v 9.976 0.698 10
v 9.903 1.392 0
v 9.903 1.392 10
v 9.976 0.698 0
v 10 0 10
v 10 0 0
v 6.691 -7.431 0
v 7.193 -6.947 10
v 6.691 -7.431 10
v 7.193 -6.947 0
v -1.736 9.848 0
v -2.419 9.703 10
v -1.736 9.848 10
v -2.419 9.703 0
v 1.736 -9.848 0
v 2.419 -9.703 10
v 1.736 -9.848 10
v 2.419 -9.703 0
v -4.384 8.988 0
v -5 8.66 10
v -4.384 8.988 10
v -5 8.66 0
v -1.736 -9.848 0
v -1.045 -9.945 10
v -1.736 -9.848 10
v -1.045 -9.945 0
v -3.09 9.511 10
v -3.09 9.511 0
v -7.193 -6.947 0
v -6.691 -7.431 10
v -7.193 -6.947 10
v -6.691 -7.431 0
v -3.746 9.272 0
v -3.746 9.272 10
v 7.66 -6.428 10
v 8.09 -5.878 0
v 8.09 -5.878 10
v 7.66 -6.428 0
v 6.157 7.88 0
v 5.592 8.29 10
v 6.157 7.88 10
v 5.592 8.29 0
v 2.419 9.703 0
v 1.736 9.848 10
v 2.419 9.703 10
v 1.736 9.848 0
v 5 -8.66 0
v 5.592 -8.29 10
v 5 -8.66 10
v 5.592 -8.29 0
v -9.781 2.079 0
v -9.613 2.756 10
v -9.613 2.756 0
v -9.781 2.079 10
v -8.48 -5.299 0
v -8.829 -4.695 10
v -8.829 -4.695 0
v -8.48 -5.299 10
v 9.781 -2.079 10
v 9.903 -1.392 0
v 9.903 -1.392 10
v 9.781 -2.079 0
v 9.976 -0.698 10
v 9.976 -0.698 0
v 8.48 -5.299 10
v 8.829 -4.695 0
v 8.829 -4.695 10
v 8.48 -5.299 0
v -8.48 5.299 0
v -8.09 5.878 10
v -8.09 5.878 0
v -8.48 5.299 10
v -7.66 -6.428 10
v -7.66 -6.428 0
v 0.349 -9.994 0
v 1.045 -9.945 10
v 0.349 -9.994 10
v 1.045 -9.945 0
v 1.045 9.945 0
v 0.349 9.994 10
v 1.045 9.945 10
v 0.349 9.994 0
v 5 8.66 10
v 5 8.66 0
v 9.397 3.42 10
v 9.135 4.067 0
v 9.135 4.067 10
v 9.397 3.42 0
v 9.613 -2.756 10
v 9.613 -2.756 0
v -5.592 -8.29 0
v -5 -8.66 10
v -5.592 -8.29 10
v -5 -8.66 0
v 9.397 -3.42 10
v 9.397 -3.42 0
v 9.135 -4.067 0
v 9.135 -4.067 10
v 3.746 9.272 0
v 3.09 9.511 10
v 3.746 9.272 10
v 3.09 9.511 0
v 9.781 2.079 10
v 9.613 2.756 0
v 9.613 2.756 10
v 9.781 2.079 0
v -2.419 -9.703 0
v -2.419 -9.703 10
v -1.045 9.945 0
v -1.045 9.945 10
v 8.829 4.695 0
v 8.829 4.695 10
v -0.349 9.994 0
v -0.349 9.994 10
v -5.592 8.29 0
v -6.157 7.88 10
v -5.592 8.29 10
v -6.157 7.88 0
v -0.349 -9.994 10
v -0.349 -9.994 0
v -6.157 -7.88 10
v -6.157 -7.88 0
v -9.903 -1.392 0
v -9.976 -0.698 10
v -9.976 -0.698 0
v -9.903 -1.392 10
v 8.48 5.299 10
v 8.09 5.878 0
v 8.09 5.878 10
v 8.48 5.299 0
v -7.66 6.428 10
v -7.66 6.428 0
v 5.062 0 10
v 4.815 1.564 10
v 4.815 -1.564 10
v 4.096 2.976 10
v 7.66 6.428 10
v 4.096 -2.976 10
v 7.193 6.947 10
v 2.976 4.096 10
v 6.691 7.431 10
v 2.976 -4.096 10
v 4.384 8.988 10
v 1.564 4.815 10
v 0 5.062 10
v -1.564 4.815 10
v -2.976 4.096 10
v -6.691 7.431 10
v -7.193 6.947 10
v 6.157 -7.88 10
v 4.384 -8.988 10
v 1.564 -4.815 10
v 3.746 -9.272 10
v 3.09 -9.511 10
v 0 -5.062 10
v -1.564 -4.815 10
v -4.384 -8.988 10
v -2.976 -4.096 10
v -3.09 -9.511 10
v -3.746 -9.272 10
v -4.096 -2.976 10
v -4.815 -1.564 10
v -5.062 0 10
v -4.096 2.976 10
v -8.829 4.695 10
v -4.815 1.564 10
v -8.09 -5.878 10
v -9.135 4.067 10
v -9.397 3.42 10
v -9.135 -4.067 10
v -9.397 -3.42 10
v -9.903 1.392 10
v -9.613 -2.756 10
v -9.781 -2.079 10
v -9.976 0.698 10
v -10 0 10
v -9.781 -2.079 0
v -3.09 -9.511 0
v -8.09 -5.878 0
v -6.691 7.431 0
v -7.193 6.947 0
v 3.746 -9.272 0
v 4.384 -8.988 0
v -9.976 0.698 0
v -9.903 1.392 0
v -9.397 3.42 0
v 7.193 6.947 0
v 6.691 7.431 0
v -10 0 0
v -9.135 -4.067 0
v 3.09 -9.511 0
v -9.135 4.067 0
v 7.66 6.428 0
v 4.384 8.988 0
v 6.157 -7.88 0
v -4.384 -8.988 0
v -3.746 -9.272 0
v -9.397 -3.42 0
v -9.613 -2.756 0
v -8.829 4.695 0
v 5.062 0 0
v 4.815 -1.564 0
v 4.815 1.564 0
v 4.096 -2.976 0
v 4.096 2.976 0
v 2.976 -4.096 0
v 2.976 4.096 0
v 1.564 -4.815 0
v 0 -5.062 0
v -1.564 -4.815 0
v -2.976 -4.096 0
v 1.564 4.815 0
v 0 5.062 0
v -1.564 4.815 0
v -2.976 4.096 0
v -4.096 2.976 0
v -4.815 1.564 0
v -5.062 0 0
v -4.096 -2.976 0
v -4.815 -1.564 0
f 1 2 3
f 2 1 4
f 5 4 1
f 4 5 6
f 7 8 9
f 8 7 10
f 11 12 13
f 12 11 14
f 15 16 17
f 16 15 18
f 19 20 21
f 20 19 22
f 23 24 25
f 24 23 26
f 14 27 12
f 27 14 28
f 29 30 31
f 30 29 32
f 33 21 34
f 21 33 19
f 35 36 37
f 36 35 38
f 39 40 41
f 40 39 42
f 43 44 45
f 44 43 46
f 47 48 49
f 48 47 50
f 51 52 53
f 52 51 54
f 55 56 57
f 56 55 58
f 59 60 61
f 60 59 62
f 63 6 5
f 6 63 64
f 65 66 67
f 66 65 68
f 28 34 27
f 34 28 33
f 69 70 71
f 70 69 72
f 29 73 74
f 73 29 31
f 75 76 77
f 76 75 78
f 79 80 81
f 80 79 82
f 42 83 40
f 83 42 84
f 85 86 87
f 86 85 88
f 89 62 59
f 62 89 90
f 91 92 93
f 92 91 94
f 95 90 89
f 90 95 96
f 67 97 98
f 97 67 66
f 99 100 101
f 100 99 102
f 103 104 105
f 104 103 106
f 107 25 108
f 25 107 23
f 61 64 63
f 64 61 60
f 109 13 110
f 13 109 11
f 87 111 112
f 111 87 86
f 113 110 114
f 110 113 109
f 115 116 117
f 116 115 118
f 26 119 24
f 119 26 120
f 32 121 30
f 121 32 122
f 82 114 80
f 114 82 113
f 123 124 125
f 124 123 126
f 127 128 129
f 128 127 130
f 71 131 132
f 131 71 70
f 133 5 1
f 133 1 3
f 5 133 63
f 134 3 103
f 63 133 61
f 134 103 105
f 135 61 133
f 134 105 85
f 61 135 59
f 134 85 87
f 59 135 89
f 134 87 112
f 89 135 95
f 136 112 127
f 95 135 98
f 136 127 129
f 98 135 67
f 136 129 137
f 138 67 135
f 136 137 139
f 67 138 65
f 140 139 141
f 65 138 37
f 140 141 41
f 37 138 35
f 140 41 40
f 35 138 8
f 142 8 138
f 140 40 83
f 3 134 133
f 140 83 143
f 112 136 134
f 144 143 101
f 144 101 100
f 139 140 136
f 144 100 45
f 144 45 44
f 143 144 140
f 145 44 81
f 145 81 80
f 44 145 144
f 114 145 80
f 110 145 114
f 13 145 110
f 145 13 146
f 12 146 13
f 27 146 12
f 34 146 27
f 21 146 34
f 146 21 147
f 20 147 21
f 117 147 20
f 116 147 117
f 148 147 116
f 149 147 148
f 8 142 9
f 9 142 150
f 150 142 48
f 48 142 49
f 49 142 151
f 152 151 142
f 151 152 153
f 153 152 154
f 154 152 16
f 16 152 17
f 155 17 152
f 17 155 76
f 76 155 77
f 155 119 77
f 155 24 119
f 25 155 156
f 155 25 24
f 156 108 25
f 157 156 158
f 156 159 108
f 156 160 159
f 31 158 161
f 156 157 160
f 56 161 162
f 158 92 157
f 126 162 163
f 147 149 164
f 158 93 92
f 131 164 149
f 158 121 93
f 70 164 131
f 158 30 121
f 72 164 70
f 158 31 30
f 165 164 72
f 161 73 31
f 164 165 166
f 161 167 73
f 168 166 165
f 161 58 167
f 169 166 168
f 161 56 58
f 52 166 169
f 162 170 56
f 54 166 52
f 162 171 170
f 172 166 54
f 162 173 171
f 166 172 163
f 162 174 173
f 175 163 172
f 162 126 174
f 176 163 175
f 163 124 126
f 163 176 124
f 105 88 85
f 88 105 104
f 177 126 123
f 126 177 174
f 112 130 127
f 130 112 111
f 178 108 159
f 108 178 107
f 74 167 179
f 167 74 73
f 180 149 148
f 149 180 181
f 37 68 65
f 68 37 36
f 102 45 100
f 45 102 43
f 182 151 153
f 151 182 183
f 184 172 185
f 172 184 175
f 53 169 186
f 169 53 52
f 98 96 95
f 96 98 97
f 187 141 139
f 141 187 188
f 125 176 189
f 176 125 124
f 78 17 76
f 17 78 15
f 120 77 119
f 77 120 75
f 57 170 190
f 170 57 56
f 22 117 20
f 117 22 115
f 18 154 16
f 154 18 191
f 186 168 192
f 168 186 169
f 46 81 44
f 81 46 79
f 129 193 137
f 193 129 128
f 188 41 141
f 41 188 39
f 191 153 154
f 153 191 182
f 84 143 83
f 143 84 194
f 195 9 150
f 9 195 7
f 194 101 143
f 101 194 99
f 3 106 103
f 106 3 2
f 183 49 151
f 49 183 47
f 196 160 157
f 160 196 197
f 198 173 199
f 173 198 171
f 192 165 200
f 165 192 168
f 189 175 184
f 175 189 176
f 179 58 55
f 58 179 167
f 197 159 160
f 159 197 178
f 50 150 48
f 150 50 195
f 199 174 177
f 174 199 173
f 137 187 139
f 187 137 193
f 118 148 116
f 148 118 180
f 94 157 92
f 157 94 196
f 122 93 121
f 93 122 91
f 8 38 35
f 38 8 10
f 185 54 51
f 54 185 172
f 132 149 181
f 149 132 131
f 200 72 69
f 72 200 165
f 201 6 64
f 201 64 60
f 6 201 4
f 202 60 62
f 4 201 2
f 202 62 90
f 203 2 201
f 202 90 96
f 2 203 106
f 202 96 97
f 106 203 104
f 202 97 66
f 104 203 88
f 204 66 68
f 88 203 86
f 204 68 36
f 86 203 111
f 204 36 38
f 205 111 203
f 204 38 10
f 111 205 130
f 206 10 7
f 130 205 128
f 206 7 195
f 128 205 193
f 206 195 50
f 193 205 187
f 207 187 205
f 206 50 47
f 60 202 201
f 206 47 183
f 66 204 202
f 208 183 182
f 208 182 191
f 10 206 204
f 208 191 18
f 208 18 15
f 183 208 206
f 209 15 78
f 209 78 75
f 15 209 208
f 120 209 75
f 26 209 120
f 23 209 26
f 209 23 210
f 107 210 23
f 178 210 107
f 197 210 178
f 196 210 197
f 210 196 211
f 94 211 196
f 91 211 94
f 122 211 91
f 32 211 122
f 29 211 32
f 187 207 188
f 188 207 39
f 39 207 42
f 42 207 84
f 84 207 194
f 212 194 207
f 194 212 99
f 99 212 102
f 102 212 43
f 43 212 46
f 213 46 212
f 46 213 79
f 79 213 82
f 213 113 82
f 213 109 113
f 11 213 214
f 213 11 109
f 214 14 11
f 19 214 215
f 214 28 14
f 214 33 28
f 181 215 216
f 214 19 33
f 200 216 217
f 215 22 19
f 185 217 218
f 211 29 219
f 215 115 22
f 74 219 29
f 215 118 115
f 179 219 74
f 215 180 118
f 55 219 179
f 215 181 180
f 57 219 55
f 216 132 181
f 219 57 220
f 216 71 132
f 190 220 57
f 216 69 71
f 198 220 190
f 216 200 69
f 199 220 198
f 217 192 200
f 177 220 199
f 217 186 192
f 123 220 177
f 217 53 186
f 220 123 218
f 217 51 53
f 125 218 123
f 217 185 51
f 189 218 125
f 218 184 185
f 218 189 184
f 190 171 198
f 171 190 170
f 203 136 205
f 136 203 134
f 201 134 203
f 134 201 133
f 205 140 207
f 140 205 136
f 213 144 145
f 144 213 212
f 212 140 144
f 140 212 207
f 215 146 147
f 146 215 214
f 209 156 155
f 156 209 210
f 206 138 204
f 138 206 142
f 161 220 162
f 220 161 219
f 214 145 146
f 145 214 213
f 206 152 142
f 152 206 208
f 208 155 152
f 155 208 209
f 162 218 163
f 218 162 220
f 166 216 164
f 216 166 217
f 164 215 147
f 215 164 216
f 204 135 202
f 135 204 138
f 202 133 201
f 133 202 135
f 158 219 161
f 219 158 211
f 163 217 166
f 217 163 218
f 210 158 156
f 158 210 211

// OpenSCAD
// file: polyhole.scad
// The Cylinder is dead! Long live the Cylinder!
// A module for a polyhole by radius, based on Nophead's work.

module polyhole(h, r, cent = false)
{
    n = max(round(4 * r), 3);
    cylinder(h = h, r = r / cos(180 / n), $fn = n, center = cent);
}
// main file
use<polyhole.scad>

spacer(10, 10, 5);

module spacer(hei, or, ir, cent = false)
{
    difference()
    {
        cylinder(h = hei, r = or, center = cent, $fn = 90);
        polyhole(hei, ir, cent);
    }
}
